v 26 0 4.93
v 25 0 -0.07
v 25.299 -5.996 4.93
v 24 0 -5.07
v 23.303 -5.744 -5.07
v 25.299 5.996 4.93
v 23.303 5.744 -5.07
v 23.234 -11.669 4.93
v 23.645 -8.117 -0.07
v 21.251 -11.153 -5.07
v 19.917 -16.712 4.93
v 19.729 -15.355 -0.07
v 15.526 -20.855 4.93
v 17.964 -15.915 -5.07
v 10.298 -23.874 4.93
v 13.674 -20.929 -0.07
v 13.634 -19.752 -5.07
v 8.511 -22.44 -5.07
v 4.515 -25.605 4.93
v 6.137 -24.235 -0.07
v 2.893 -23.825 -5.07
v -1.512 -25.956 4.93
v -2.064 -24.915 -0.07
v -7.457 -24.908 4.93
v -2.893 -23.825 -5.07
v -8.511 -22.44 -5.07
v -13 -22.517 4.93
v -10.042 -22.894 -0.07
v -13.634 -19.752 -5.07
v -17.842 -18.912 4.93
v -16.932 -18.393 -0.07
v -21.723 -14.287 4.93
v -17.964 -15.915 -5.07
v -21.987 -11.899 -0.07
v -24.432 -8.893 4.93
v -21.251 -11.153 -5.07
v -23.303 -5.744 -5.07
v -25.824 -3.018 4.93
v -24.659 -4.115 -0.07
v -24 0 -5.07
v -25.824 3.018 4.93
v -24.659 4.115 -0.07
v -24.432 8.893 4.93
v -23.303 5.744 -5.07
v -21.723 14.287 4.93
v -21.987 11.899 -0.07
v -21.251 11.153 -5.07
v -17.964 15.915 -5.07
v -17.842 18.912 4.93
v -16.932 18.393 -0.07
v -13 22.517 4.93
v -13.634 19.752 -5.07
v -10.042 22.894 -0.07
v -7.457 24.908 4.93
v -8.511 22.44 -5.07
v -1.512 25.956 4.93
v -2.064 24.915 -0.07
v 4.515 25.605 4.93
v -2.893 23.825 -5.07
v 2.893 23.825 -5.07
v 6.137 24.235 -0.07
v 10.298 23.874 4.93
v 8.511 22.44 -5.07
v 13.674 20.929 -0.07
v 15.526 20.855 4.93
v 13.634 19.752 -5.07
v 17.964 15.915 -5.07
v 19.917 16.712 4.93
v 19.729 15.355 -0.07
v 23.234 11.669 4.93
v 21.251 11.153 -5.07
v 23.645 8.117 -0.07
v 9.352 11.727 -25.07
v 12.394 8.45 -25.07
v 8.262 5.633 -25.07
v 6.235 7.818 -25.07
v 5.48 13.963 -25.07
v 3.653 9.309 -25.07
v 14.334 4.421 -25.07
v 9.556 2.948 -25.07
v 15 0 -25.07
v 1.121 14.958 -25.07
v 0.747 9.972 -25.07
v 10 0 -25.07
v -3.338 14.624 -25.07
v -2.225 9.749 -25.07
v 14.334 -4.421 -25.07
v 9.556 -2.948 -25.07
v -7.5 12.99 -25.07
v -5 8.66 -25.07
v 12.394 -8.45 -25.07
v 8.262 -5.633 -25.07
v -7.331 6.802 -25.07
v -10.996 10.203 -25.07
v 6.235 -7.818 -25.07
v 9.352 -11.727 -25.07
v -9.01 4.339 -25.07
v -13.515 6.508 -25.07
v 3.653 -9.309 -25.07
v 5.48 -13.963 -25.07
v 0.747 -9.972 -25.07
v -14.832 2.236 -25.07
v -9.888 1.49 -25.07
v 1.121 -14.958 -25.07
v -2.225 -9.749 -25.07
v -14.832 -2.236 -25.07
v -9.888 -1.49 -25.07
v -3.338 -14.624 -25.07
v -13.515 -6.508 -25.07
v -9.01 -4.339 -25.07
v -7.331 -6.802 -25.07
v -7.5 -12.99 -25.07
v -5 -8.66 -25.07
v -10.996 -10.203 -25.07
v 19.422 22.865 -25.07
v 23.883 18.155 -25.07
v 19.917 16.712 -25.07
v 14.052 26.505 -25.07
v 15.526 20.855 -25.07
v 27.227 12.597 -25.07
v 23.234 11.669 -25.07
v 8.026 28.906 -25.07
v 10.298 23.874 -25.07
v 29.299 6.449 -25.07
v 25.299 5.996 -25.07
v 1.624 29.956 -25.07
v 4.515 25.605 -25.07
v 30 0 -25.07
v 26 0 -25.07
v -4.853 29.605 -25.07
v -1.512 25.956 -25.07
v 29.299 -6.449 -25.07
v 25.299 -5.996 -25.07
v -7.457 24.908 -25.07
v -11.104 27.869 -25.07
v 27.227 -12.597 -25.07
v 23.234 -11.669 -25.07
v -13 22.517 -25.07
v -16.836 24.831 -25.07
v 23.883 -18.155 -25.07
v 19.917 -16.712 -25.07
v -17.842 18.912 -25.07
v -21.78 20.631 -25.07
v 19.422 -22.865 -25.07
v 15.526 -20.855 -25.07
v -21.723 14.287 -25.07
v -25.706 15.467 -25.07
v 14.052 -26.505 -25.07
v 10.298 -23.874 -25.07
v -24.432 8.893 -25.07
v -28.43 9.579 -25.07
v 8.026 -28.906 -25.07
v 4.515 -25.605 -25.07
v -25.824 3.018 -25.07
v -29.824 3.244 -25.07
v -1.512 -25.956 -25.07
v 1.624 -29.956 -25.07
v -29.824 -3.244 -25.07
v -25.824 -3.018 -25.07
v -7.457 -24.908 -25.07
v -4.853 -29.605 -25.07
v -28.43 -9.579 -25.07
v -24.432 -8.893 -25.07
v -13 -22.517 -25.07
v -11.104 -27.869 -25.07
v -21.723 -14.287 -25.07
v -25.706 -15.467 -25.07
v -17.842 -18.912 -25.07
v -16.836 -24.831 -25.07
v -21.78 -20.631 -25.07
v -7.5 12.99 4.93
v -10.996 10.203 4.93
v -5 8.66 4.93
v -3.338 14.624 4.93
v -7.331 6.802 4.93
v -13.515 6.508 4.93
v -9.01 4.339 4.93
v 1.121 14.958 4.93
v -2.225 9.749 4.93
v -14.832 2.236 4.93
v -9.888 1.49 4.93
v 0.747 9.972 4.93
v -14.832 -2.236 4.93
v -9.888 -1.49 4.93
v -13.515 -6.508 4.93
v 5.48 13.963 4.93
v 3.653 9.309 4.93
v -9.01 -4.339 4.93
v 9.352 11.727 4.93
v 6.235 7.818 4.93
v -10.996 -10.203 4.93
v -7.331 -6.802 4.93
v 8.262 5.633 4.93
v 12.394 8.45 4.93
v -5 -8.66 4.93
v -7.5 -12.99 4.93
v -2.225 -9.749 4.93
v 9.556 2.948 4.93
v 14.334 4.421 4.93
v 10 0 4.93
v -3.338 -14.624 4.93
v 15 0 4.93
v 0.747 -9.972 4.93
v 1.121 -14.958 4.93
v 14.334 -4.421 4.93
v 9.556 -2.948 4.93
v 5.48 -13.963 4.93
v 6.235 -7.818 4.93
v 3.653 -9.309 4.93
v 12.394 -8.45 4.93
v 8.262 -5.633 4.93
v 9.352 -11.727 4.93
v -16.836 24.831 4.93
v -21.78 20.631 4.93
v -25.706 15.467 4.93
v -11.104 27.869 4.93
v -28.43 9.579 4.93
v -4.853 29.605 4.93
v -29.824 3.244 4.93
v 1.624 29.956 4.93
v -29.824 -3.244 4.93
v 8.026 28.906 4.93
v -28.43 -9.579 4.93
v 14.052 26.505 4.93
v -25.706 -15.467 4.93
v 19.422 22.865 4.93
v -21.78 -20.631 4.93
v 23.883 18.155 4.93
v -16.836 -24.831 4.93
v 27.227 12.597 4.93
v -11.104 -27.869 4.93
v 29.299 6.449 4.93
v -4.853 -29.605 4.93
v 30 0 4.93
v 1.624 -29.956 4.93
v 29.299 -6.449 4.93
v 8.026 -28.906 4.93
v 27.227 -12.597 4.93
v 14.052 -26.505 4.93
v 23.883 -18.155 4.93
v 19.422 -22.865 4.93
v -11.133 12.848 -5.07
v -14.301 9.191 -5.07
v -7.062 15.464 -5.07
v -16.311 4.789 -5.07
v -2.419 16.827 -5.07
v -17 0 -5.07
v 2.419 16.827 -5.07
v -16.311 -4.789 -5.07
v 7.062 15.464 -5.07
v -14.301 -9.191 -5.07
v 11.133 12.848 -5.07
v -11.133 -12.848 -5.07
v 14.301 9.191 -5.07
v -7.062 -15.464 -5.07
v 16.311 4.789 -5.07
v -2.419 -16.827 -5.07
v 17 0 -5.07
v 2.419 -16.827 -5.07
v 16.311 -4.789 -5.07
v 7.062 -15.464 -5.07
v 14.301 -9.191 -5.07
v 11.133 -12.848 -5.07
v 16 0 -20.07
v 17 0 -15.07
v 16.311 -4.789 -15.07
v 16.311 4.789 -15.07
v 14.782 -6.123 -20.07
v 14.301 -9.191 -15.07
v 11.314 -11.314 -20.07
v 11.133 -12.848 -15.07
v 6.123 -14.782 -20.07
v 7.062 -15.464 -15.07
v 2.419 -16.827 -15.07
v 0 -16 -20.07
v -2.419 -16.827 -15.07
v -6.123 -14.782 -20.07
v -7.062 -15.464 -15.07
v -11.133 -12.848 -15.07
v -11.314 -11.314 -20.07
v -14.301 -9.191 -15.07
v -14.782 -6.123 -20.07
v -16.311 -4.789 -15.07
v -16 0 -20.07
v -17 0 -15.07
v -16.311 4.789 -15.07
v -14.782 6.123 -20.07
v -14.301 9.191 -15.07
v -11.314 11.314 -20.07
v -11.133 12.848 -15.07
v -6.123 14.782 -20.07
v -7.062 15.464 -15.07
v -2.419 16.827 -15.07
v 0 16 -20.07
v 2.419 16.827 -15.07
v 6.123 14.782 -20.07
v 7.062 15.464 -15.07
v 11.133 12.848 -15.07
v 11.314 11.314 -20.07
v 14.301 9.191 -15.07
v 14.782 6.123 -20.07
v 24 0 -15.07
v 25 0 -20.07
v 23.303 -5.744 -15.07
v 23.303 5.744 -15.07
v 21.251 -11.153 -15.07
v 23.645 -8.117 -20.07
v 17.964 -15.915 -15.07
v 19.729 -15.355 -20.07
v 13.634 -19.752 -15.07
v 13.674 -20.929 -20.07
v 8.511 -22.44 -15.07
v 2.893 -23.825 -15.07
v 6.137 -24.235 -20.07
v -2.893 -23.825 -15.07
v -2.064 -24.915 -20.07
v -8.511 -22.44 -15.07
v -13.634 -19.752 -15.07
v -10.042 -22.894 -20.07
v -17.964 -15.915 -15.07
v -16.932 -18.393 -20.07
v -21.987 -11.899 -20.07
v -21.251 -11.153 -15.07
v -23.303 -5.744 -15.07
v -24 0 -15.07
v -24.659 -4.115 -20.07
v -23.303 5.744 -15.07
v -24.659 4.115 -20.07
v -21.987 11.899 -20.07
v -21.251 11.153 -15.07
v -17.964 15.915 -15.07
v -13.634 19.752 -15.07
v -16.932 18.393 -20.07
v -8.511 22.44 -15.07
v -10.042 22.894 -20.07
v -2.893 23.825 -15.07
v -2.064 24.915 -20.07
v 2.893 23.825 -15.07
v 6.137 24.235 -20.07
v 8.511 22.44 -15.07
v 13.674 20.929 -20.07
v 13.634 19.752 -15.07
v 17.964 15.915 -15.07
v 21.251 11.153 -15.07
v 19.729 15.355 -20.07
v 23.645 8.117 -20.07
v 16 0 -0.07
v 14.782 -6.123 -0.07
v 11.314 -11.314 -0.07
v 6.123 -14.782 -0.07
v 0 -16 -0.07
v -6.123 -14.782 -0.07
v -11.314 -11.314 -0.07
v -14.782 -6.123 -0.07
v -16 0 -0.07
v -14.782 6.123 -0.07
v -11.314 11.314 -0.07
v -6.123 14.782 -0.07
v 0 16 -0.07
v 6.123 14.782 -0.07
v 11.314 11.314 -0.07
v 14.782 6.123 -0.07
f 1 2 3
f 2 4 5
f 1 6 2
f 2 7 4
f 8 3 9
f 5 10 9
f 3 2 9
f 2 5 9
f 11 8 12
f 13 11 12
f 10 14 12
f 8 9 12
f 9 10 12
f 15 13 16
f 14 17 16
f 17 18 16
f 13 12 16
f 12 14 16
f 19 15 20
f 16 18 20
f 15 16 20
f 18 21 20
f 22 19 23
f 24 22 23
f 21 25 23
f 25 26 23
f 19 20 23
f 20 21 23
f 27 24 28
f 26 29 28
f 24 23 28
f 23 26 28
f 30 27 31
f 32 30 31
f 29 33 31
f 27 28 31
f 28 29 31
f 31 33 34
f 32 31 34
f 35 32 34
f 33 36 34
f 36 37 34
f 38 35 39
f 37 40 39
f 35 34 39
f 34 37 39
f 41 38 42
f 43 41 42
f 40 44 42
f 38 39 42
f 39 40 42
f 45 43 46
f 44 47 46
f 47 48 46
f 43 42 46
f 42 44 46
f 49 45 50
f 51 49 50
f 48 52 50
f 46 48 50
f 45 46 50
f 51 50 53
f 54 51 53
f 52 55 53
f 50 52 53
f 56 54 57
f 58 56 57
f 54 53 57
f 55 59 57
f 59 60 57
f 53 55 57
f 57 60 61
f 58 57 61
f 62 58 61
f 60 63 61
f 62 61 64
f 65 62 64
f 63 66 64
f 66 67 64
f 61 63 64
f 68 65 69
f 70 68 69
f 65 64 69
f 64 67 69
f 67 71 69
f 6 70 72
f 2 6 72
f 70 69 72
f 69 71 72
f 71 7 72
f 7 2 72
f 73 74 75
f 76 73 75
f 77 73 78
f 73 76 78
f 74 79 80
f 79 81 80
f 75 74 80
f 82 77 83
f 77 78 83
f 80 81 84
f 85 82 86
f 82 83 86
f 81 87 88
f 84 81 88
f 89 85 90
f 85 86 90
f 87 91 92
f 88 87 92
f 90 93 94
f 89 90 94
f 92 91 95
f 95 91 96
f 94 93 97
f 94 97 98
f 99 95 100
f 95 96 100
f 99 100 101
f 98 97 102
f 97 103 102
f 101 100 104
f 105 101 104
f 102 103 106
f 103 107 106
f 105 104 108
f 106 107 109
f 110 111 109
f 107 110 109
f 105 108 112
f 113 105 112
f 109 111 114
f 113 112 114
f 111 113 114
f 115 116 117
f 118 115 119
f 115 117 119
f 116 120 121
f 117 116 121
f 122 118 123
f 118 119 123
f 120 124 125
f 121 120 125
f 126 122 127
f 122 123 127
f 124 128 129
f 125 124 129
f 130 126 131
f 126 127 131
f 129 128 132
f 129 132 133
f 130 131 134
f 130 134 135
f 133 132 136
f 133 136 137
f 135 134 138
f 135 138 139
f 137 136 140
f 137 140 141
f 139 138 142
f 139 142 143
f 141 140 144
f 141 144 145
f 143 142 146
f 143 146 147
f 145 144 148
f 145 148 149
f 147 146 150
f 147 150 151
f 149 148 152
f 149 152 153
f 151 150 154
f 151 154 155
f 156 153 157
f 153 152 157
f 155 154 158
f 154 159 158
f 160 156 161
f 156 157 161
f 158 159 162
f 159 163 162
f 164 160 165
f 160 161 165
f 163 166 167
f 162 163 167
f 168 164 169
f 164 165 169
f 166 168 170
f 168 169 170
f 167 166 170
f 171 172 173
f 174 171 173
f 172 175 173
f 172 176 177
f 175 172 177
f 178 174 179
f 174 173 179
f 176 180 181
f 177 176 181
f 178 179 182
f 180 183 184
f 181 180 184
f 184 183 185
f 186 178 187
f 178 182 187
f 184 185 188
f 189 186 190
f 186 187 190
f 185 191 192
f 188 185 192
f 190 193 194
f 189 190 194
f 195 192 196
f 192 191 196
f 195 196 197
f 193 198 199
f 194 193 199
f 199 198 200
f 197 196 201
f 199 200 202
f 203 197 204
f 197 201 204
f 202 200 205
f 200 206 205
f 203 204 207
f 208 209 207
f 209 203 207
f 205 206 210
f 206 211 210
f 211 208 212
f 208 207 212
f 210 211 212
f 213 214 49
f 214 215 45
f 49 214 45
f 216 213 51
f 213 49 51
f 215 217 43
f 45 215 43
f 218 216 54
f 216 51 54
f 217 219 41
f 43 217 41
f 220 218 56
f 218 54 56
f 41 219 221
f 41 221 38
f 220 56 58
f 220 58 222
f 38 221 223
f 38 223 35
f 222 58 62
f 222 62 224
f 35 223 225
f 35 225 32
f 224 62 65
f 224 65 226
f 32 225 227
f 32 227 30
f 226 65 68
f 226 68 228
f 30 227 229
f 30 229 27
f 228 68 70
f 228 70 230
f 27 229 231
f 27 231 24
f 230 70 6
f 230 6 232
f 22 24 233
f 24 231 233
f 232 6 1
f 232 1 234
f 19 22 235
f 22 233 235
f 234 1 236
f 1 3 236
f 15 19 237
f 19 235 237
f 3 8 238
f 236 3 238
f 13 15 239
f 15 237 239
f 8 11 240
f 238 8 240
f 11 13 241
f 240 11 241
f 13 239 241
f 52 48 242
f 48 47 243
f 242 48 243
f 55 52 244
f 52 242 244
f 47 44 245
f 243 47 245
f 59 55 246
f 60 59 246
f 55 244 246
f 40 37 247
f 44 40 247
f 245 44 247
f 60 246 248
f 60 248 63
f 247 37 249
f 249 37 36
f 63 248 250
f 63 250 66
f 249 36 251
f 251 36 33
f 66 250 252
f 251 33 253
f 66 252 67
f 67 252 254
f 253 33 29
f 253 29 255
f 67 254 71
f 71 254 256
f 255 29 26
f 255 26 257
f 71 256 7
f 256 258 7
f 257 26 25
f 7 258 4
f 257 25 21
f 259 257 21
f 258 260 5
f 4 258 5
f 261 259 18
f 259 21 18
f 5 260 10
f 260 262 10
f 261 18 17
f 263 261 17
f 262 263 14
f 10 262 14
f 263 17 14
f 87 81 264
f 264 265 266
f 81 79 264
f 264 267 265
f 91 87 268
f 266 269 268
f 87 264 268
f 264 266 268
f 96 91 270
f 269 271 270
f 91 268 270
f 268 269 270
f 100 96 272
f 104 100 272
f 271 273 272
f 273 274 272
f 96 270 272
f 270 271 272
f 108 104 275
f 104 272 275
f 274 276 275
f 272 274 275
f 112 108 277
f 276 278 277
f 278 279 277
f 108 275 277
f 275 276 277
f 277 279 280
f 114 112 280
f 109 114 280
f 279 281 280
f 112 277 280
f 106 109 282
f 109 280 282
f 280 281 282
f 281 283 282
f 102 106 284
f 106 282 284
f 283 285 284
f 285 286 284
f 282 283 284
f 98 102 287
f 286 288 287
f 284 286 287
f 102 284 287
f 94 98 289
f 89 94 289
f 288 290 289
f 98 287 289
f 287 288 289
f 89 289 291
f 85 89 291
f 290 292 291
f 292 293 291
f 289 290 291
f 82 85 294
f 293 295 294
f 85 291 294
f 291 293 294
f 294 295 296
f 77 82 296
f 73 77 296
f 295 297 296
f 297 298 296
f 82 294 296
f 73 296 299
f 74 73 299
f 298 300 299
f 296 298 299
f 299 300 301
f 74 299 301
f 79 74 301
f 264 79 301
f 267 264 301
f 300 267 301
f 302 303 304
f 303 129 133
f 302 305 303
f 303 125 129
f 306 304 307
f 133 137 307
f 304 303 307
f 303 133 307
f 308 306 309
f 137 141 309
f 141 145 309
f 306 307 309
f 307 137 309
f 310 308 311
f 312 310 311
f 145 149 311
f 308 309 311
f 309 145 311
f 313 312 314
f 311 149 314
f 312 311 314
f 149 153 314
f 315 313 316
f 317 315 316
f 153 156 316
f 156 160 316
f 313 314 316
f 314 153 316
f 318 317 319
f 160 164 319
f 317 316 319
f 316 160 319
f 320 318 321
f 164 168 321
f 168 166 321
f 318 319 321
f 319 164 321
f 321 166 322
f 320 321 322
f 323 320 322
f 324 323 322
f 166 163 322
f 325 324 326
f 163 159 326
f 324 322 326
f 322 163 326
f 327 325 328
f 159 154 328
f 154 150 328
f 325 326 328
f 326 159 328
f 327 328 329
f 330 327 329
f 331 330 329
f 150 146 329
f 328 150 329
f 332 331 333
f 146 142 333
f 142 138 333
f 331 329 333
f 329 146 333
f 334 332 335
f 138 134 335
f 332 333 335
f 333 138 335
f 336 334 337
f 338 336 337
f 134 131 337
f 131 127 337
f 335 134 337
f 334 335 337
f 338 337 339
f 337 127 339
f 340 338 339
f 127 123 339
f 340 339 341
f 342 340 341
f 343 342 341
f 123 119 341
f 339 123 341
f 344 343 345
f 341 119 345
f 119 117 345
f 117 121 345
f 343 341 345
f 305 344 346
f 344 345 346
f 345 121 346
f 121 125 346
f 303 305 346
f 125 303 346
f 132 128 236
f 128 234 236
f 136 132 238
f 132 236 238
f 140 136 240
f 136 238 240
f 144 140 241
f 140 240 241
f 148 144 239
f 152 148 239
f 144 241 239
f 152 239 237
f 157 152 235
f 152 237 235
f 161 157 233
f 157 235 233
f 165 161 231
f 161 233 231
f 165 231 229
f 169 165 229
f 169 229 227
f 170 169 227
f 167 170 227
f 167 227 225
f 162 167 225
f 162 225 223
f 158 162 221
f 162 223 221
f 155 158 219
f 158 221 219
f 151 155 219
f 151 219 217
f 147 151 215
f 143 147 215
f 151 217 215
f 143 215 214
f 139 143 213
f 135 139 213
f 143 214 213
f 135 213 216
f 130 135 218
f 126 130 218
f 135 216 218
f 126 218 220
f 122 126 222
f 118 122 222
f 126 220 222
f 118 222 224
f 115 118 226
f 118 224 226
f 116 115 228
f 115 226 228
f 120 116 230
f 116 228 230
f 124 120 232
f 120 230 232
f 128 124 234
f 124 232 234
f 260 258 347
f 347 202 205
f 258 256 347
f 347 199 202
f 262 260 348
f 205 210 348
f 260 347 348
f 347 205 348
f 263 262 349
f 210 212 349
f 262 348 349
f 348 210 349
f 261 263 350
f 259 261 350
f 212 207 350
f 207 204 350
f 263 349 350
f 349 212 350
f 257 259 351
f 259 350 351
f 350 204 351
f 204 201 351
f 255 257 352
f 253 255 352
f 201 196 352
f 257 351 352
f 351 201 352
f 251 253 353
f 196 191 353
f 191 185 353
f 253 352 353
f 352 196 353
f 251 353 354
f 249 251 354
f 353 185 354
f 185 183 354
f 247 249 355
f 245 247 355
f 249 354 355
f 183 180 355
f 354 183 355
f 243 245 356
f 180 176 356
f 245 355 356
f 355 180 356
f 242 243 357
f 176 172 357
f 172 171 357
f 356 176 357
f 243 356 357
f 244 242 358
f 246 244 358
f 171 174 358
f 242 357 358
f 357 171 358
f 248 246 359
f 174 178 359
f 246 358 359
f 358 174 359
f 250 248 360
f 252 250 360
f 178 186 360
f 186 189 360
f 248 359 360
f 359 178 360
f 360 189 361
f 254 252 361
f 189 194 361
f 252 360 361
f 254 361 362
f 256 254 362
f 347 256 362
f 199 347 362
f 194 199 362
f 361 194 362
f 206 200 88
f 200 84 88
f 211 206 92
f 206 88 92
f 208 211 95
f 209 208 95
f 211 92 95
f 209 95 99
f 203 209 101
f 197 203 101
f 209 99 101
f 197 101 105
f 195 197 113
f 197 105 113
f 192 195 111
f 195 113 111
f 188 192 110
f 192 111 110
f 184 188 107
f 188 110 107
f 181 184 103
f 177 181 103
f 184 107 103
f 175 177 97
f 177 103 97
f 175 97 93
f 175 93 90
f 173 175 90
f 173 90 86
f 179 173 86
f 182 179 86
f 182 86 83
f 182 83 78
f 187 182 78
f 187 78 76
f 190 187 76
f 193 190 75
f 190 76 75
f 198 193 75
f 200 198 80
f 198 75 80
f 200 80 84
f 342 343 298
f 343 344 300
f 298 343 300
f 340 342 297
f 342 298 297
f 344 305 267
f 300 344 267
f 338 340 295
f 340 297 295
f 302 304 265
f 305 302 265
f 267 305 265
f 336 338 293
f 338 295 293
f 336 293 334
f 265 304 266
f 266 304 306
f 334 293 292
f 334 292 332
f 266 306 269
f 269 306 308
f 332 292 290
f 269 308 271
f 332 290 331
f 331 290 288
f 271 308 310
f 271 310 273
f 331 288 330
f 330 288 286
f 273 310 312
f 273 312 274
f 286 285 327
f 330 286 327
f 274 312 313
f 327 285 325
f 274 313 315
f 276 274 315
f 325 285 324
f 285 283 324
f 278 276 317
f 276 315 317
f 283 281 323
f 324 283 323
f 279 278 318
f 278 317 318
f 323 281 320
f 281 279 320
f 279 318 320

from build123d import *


with BuildPart() as part:
    # Çizim1 → Döndür2 (revolve)
    with BuildSketch(Plane(origin=(0, 0, 0), x_dir=(0, 0, -1), z_dir=(1, 0, 0)), mode=Mode.PRIVATE) as d_nd_r2_sk:
        Polygon((-4.929577465, 10), (25.070422535, 10), (25.070422535, 15), (15.070422535, 17), (15.070422535, 24), (25.070422535, 26), (25.070422535, 30), (-4.929577465, 30), (-4.929577465, 26), (5.070422535, 24), (5.070422535, 17), (-4.929577465, 15), align=None)
    revolve(d_nd_r2_sk.sketch.rotate(Axis((0, 0, 34.929577465), (0, 0, -1)), 90), axis=Axis((0, 0, 34.929577465), (0, 0, -1)))


solid = part.part
